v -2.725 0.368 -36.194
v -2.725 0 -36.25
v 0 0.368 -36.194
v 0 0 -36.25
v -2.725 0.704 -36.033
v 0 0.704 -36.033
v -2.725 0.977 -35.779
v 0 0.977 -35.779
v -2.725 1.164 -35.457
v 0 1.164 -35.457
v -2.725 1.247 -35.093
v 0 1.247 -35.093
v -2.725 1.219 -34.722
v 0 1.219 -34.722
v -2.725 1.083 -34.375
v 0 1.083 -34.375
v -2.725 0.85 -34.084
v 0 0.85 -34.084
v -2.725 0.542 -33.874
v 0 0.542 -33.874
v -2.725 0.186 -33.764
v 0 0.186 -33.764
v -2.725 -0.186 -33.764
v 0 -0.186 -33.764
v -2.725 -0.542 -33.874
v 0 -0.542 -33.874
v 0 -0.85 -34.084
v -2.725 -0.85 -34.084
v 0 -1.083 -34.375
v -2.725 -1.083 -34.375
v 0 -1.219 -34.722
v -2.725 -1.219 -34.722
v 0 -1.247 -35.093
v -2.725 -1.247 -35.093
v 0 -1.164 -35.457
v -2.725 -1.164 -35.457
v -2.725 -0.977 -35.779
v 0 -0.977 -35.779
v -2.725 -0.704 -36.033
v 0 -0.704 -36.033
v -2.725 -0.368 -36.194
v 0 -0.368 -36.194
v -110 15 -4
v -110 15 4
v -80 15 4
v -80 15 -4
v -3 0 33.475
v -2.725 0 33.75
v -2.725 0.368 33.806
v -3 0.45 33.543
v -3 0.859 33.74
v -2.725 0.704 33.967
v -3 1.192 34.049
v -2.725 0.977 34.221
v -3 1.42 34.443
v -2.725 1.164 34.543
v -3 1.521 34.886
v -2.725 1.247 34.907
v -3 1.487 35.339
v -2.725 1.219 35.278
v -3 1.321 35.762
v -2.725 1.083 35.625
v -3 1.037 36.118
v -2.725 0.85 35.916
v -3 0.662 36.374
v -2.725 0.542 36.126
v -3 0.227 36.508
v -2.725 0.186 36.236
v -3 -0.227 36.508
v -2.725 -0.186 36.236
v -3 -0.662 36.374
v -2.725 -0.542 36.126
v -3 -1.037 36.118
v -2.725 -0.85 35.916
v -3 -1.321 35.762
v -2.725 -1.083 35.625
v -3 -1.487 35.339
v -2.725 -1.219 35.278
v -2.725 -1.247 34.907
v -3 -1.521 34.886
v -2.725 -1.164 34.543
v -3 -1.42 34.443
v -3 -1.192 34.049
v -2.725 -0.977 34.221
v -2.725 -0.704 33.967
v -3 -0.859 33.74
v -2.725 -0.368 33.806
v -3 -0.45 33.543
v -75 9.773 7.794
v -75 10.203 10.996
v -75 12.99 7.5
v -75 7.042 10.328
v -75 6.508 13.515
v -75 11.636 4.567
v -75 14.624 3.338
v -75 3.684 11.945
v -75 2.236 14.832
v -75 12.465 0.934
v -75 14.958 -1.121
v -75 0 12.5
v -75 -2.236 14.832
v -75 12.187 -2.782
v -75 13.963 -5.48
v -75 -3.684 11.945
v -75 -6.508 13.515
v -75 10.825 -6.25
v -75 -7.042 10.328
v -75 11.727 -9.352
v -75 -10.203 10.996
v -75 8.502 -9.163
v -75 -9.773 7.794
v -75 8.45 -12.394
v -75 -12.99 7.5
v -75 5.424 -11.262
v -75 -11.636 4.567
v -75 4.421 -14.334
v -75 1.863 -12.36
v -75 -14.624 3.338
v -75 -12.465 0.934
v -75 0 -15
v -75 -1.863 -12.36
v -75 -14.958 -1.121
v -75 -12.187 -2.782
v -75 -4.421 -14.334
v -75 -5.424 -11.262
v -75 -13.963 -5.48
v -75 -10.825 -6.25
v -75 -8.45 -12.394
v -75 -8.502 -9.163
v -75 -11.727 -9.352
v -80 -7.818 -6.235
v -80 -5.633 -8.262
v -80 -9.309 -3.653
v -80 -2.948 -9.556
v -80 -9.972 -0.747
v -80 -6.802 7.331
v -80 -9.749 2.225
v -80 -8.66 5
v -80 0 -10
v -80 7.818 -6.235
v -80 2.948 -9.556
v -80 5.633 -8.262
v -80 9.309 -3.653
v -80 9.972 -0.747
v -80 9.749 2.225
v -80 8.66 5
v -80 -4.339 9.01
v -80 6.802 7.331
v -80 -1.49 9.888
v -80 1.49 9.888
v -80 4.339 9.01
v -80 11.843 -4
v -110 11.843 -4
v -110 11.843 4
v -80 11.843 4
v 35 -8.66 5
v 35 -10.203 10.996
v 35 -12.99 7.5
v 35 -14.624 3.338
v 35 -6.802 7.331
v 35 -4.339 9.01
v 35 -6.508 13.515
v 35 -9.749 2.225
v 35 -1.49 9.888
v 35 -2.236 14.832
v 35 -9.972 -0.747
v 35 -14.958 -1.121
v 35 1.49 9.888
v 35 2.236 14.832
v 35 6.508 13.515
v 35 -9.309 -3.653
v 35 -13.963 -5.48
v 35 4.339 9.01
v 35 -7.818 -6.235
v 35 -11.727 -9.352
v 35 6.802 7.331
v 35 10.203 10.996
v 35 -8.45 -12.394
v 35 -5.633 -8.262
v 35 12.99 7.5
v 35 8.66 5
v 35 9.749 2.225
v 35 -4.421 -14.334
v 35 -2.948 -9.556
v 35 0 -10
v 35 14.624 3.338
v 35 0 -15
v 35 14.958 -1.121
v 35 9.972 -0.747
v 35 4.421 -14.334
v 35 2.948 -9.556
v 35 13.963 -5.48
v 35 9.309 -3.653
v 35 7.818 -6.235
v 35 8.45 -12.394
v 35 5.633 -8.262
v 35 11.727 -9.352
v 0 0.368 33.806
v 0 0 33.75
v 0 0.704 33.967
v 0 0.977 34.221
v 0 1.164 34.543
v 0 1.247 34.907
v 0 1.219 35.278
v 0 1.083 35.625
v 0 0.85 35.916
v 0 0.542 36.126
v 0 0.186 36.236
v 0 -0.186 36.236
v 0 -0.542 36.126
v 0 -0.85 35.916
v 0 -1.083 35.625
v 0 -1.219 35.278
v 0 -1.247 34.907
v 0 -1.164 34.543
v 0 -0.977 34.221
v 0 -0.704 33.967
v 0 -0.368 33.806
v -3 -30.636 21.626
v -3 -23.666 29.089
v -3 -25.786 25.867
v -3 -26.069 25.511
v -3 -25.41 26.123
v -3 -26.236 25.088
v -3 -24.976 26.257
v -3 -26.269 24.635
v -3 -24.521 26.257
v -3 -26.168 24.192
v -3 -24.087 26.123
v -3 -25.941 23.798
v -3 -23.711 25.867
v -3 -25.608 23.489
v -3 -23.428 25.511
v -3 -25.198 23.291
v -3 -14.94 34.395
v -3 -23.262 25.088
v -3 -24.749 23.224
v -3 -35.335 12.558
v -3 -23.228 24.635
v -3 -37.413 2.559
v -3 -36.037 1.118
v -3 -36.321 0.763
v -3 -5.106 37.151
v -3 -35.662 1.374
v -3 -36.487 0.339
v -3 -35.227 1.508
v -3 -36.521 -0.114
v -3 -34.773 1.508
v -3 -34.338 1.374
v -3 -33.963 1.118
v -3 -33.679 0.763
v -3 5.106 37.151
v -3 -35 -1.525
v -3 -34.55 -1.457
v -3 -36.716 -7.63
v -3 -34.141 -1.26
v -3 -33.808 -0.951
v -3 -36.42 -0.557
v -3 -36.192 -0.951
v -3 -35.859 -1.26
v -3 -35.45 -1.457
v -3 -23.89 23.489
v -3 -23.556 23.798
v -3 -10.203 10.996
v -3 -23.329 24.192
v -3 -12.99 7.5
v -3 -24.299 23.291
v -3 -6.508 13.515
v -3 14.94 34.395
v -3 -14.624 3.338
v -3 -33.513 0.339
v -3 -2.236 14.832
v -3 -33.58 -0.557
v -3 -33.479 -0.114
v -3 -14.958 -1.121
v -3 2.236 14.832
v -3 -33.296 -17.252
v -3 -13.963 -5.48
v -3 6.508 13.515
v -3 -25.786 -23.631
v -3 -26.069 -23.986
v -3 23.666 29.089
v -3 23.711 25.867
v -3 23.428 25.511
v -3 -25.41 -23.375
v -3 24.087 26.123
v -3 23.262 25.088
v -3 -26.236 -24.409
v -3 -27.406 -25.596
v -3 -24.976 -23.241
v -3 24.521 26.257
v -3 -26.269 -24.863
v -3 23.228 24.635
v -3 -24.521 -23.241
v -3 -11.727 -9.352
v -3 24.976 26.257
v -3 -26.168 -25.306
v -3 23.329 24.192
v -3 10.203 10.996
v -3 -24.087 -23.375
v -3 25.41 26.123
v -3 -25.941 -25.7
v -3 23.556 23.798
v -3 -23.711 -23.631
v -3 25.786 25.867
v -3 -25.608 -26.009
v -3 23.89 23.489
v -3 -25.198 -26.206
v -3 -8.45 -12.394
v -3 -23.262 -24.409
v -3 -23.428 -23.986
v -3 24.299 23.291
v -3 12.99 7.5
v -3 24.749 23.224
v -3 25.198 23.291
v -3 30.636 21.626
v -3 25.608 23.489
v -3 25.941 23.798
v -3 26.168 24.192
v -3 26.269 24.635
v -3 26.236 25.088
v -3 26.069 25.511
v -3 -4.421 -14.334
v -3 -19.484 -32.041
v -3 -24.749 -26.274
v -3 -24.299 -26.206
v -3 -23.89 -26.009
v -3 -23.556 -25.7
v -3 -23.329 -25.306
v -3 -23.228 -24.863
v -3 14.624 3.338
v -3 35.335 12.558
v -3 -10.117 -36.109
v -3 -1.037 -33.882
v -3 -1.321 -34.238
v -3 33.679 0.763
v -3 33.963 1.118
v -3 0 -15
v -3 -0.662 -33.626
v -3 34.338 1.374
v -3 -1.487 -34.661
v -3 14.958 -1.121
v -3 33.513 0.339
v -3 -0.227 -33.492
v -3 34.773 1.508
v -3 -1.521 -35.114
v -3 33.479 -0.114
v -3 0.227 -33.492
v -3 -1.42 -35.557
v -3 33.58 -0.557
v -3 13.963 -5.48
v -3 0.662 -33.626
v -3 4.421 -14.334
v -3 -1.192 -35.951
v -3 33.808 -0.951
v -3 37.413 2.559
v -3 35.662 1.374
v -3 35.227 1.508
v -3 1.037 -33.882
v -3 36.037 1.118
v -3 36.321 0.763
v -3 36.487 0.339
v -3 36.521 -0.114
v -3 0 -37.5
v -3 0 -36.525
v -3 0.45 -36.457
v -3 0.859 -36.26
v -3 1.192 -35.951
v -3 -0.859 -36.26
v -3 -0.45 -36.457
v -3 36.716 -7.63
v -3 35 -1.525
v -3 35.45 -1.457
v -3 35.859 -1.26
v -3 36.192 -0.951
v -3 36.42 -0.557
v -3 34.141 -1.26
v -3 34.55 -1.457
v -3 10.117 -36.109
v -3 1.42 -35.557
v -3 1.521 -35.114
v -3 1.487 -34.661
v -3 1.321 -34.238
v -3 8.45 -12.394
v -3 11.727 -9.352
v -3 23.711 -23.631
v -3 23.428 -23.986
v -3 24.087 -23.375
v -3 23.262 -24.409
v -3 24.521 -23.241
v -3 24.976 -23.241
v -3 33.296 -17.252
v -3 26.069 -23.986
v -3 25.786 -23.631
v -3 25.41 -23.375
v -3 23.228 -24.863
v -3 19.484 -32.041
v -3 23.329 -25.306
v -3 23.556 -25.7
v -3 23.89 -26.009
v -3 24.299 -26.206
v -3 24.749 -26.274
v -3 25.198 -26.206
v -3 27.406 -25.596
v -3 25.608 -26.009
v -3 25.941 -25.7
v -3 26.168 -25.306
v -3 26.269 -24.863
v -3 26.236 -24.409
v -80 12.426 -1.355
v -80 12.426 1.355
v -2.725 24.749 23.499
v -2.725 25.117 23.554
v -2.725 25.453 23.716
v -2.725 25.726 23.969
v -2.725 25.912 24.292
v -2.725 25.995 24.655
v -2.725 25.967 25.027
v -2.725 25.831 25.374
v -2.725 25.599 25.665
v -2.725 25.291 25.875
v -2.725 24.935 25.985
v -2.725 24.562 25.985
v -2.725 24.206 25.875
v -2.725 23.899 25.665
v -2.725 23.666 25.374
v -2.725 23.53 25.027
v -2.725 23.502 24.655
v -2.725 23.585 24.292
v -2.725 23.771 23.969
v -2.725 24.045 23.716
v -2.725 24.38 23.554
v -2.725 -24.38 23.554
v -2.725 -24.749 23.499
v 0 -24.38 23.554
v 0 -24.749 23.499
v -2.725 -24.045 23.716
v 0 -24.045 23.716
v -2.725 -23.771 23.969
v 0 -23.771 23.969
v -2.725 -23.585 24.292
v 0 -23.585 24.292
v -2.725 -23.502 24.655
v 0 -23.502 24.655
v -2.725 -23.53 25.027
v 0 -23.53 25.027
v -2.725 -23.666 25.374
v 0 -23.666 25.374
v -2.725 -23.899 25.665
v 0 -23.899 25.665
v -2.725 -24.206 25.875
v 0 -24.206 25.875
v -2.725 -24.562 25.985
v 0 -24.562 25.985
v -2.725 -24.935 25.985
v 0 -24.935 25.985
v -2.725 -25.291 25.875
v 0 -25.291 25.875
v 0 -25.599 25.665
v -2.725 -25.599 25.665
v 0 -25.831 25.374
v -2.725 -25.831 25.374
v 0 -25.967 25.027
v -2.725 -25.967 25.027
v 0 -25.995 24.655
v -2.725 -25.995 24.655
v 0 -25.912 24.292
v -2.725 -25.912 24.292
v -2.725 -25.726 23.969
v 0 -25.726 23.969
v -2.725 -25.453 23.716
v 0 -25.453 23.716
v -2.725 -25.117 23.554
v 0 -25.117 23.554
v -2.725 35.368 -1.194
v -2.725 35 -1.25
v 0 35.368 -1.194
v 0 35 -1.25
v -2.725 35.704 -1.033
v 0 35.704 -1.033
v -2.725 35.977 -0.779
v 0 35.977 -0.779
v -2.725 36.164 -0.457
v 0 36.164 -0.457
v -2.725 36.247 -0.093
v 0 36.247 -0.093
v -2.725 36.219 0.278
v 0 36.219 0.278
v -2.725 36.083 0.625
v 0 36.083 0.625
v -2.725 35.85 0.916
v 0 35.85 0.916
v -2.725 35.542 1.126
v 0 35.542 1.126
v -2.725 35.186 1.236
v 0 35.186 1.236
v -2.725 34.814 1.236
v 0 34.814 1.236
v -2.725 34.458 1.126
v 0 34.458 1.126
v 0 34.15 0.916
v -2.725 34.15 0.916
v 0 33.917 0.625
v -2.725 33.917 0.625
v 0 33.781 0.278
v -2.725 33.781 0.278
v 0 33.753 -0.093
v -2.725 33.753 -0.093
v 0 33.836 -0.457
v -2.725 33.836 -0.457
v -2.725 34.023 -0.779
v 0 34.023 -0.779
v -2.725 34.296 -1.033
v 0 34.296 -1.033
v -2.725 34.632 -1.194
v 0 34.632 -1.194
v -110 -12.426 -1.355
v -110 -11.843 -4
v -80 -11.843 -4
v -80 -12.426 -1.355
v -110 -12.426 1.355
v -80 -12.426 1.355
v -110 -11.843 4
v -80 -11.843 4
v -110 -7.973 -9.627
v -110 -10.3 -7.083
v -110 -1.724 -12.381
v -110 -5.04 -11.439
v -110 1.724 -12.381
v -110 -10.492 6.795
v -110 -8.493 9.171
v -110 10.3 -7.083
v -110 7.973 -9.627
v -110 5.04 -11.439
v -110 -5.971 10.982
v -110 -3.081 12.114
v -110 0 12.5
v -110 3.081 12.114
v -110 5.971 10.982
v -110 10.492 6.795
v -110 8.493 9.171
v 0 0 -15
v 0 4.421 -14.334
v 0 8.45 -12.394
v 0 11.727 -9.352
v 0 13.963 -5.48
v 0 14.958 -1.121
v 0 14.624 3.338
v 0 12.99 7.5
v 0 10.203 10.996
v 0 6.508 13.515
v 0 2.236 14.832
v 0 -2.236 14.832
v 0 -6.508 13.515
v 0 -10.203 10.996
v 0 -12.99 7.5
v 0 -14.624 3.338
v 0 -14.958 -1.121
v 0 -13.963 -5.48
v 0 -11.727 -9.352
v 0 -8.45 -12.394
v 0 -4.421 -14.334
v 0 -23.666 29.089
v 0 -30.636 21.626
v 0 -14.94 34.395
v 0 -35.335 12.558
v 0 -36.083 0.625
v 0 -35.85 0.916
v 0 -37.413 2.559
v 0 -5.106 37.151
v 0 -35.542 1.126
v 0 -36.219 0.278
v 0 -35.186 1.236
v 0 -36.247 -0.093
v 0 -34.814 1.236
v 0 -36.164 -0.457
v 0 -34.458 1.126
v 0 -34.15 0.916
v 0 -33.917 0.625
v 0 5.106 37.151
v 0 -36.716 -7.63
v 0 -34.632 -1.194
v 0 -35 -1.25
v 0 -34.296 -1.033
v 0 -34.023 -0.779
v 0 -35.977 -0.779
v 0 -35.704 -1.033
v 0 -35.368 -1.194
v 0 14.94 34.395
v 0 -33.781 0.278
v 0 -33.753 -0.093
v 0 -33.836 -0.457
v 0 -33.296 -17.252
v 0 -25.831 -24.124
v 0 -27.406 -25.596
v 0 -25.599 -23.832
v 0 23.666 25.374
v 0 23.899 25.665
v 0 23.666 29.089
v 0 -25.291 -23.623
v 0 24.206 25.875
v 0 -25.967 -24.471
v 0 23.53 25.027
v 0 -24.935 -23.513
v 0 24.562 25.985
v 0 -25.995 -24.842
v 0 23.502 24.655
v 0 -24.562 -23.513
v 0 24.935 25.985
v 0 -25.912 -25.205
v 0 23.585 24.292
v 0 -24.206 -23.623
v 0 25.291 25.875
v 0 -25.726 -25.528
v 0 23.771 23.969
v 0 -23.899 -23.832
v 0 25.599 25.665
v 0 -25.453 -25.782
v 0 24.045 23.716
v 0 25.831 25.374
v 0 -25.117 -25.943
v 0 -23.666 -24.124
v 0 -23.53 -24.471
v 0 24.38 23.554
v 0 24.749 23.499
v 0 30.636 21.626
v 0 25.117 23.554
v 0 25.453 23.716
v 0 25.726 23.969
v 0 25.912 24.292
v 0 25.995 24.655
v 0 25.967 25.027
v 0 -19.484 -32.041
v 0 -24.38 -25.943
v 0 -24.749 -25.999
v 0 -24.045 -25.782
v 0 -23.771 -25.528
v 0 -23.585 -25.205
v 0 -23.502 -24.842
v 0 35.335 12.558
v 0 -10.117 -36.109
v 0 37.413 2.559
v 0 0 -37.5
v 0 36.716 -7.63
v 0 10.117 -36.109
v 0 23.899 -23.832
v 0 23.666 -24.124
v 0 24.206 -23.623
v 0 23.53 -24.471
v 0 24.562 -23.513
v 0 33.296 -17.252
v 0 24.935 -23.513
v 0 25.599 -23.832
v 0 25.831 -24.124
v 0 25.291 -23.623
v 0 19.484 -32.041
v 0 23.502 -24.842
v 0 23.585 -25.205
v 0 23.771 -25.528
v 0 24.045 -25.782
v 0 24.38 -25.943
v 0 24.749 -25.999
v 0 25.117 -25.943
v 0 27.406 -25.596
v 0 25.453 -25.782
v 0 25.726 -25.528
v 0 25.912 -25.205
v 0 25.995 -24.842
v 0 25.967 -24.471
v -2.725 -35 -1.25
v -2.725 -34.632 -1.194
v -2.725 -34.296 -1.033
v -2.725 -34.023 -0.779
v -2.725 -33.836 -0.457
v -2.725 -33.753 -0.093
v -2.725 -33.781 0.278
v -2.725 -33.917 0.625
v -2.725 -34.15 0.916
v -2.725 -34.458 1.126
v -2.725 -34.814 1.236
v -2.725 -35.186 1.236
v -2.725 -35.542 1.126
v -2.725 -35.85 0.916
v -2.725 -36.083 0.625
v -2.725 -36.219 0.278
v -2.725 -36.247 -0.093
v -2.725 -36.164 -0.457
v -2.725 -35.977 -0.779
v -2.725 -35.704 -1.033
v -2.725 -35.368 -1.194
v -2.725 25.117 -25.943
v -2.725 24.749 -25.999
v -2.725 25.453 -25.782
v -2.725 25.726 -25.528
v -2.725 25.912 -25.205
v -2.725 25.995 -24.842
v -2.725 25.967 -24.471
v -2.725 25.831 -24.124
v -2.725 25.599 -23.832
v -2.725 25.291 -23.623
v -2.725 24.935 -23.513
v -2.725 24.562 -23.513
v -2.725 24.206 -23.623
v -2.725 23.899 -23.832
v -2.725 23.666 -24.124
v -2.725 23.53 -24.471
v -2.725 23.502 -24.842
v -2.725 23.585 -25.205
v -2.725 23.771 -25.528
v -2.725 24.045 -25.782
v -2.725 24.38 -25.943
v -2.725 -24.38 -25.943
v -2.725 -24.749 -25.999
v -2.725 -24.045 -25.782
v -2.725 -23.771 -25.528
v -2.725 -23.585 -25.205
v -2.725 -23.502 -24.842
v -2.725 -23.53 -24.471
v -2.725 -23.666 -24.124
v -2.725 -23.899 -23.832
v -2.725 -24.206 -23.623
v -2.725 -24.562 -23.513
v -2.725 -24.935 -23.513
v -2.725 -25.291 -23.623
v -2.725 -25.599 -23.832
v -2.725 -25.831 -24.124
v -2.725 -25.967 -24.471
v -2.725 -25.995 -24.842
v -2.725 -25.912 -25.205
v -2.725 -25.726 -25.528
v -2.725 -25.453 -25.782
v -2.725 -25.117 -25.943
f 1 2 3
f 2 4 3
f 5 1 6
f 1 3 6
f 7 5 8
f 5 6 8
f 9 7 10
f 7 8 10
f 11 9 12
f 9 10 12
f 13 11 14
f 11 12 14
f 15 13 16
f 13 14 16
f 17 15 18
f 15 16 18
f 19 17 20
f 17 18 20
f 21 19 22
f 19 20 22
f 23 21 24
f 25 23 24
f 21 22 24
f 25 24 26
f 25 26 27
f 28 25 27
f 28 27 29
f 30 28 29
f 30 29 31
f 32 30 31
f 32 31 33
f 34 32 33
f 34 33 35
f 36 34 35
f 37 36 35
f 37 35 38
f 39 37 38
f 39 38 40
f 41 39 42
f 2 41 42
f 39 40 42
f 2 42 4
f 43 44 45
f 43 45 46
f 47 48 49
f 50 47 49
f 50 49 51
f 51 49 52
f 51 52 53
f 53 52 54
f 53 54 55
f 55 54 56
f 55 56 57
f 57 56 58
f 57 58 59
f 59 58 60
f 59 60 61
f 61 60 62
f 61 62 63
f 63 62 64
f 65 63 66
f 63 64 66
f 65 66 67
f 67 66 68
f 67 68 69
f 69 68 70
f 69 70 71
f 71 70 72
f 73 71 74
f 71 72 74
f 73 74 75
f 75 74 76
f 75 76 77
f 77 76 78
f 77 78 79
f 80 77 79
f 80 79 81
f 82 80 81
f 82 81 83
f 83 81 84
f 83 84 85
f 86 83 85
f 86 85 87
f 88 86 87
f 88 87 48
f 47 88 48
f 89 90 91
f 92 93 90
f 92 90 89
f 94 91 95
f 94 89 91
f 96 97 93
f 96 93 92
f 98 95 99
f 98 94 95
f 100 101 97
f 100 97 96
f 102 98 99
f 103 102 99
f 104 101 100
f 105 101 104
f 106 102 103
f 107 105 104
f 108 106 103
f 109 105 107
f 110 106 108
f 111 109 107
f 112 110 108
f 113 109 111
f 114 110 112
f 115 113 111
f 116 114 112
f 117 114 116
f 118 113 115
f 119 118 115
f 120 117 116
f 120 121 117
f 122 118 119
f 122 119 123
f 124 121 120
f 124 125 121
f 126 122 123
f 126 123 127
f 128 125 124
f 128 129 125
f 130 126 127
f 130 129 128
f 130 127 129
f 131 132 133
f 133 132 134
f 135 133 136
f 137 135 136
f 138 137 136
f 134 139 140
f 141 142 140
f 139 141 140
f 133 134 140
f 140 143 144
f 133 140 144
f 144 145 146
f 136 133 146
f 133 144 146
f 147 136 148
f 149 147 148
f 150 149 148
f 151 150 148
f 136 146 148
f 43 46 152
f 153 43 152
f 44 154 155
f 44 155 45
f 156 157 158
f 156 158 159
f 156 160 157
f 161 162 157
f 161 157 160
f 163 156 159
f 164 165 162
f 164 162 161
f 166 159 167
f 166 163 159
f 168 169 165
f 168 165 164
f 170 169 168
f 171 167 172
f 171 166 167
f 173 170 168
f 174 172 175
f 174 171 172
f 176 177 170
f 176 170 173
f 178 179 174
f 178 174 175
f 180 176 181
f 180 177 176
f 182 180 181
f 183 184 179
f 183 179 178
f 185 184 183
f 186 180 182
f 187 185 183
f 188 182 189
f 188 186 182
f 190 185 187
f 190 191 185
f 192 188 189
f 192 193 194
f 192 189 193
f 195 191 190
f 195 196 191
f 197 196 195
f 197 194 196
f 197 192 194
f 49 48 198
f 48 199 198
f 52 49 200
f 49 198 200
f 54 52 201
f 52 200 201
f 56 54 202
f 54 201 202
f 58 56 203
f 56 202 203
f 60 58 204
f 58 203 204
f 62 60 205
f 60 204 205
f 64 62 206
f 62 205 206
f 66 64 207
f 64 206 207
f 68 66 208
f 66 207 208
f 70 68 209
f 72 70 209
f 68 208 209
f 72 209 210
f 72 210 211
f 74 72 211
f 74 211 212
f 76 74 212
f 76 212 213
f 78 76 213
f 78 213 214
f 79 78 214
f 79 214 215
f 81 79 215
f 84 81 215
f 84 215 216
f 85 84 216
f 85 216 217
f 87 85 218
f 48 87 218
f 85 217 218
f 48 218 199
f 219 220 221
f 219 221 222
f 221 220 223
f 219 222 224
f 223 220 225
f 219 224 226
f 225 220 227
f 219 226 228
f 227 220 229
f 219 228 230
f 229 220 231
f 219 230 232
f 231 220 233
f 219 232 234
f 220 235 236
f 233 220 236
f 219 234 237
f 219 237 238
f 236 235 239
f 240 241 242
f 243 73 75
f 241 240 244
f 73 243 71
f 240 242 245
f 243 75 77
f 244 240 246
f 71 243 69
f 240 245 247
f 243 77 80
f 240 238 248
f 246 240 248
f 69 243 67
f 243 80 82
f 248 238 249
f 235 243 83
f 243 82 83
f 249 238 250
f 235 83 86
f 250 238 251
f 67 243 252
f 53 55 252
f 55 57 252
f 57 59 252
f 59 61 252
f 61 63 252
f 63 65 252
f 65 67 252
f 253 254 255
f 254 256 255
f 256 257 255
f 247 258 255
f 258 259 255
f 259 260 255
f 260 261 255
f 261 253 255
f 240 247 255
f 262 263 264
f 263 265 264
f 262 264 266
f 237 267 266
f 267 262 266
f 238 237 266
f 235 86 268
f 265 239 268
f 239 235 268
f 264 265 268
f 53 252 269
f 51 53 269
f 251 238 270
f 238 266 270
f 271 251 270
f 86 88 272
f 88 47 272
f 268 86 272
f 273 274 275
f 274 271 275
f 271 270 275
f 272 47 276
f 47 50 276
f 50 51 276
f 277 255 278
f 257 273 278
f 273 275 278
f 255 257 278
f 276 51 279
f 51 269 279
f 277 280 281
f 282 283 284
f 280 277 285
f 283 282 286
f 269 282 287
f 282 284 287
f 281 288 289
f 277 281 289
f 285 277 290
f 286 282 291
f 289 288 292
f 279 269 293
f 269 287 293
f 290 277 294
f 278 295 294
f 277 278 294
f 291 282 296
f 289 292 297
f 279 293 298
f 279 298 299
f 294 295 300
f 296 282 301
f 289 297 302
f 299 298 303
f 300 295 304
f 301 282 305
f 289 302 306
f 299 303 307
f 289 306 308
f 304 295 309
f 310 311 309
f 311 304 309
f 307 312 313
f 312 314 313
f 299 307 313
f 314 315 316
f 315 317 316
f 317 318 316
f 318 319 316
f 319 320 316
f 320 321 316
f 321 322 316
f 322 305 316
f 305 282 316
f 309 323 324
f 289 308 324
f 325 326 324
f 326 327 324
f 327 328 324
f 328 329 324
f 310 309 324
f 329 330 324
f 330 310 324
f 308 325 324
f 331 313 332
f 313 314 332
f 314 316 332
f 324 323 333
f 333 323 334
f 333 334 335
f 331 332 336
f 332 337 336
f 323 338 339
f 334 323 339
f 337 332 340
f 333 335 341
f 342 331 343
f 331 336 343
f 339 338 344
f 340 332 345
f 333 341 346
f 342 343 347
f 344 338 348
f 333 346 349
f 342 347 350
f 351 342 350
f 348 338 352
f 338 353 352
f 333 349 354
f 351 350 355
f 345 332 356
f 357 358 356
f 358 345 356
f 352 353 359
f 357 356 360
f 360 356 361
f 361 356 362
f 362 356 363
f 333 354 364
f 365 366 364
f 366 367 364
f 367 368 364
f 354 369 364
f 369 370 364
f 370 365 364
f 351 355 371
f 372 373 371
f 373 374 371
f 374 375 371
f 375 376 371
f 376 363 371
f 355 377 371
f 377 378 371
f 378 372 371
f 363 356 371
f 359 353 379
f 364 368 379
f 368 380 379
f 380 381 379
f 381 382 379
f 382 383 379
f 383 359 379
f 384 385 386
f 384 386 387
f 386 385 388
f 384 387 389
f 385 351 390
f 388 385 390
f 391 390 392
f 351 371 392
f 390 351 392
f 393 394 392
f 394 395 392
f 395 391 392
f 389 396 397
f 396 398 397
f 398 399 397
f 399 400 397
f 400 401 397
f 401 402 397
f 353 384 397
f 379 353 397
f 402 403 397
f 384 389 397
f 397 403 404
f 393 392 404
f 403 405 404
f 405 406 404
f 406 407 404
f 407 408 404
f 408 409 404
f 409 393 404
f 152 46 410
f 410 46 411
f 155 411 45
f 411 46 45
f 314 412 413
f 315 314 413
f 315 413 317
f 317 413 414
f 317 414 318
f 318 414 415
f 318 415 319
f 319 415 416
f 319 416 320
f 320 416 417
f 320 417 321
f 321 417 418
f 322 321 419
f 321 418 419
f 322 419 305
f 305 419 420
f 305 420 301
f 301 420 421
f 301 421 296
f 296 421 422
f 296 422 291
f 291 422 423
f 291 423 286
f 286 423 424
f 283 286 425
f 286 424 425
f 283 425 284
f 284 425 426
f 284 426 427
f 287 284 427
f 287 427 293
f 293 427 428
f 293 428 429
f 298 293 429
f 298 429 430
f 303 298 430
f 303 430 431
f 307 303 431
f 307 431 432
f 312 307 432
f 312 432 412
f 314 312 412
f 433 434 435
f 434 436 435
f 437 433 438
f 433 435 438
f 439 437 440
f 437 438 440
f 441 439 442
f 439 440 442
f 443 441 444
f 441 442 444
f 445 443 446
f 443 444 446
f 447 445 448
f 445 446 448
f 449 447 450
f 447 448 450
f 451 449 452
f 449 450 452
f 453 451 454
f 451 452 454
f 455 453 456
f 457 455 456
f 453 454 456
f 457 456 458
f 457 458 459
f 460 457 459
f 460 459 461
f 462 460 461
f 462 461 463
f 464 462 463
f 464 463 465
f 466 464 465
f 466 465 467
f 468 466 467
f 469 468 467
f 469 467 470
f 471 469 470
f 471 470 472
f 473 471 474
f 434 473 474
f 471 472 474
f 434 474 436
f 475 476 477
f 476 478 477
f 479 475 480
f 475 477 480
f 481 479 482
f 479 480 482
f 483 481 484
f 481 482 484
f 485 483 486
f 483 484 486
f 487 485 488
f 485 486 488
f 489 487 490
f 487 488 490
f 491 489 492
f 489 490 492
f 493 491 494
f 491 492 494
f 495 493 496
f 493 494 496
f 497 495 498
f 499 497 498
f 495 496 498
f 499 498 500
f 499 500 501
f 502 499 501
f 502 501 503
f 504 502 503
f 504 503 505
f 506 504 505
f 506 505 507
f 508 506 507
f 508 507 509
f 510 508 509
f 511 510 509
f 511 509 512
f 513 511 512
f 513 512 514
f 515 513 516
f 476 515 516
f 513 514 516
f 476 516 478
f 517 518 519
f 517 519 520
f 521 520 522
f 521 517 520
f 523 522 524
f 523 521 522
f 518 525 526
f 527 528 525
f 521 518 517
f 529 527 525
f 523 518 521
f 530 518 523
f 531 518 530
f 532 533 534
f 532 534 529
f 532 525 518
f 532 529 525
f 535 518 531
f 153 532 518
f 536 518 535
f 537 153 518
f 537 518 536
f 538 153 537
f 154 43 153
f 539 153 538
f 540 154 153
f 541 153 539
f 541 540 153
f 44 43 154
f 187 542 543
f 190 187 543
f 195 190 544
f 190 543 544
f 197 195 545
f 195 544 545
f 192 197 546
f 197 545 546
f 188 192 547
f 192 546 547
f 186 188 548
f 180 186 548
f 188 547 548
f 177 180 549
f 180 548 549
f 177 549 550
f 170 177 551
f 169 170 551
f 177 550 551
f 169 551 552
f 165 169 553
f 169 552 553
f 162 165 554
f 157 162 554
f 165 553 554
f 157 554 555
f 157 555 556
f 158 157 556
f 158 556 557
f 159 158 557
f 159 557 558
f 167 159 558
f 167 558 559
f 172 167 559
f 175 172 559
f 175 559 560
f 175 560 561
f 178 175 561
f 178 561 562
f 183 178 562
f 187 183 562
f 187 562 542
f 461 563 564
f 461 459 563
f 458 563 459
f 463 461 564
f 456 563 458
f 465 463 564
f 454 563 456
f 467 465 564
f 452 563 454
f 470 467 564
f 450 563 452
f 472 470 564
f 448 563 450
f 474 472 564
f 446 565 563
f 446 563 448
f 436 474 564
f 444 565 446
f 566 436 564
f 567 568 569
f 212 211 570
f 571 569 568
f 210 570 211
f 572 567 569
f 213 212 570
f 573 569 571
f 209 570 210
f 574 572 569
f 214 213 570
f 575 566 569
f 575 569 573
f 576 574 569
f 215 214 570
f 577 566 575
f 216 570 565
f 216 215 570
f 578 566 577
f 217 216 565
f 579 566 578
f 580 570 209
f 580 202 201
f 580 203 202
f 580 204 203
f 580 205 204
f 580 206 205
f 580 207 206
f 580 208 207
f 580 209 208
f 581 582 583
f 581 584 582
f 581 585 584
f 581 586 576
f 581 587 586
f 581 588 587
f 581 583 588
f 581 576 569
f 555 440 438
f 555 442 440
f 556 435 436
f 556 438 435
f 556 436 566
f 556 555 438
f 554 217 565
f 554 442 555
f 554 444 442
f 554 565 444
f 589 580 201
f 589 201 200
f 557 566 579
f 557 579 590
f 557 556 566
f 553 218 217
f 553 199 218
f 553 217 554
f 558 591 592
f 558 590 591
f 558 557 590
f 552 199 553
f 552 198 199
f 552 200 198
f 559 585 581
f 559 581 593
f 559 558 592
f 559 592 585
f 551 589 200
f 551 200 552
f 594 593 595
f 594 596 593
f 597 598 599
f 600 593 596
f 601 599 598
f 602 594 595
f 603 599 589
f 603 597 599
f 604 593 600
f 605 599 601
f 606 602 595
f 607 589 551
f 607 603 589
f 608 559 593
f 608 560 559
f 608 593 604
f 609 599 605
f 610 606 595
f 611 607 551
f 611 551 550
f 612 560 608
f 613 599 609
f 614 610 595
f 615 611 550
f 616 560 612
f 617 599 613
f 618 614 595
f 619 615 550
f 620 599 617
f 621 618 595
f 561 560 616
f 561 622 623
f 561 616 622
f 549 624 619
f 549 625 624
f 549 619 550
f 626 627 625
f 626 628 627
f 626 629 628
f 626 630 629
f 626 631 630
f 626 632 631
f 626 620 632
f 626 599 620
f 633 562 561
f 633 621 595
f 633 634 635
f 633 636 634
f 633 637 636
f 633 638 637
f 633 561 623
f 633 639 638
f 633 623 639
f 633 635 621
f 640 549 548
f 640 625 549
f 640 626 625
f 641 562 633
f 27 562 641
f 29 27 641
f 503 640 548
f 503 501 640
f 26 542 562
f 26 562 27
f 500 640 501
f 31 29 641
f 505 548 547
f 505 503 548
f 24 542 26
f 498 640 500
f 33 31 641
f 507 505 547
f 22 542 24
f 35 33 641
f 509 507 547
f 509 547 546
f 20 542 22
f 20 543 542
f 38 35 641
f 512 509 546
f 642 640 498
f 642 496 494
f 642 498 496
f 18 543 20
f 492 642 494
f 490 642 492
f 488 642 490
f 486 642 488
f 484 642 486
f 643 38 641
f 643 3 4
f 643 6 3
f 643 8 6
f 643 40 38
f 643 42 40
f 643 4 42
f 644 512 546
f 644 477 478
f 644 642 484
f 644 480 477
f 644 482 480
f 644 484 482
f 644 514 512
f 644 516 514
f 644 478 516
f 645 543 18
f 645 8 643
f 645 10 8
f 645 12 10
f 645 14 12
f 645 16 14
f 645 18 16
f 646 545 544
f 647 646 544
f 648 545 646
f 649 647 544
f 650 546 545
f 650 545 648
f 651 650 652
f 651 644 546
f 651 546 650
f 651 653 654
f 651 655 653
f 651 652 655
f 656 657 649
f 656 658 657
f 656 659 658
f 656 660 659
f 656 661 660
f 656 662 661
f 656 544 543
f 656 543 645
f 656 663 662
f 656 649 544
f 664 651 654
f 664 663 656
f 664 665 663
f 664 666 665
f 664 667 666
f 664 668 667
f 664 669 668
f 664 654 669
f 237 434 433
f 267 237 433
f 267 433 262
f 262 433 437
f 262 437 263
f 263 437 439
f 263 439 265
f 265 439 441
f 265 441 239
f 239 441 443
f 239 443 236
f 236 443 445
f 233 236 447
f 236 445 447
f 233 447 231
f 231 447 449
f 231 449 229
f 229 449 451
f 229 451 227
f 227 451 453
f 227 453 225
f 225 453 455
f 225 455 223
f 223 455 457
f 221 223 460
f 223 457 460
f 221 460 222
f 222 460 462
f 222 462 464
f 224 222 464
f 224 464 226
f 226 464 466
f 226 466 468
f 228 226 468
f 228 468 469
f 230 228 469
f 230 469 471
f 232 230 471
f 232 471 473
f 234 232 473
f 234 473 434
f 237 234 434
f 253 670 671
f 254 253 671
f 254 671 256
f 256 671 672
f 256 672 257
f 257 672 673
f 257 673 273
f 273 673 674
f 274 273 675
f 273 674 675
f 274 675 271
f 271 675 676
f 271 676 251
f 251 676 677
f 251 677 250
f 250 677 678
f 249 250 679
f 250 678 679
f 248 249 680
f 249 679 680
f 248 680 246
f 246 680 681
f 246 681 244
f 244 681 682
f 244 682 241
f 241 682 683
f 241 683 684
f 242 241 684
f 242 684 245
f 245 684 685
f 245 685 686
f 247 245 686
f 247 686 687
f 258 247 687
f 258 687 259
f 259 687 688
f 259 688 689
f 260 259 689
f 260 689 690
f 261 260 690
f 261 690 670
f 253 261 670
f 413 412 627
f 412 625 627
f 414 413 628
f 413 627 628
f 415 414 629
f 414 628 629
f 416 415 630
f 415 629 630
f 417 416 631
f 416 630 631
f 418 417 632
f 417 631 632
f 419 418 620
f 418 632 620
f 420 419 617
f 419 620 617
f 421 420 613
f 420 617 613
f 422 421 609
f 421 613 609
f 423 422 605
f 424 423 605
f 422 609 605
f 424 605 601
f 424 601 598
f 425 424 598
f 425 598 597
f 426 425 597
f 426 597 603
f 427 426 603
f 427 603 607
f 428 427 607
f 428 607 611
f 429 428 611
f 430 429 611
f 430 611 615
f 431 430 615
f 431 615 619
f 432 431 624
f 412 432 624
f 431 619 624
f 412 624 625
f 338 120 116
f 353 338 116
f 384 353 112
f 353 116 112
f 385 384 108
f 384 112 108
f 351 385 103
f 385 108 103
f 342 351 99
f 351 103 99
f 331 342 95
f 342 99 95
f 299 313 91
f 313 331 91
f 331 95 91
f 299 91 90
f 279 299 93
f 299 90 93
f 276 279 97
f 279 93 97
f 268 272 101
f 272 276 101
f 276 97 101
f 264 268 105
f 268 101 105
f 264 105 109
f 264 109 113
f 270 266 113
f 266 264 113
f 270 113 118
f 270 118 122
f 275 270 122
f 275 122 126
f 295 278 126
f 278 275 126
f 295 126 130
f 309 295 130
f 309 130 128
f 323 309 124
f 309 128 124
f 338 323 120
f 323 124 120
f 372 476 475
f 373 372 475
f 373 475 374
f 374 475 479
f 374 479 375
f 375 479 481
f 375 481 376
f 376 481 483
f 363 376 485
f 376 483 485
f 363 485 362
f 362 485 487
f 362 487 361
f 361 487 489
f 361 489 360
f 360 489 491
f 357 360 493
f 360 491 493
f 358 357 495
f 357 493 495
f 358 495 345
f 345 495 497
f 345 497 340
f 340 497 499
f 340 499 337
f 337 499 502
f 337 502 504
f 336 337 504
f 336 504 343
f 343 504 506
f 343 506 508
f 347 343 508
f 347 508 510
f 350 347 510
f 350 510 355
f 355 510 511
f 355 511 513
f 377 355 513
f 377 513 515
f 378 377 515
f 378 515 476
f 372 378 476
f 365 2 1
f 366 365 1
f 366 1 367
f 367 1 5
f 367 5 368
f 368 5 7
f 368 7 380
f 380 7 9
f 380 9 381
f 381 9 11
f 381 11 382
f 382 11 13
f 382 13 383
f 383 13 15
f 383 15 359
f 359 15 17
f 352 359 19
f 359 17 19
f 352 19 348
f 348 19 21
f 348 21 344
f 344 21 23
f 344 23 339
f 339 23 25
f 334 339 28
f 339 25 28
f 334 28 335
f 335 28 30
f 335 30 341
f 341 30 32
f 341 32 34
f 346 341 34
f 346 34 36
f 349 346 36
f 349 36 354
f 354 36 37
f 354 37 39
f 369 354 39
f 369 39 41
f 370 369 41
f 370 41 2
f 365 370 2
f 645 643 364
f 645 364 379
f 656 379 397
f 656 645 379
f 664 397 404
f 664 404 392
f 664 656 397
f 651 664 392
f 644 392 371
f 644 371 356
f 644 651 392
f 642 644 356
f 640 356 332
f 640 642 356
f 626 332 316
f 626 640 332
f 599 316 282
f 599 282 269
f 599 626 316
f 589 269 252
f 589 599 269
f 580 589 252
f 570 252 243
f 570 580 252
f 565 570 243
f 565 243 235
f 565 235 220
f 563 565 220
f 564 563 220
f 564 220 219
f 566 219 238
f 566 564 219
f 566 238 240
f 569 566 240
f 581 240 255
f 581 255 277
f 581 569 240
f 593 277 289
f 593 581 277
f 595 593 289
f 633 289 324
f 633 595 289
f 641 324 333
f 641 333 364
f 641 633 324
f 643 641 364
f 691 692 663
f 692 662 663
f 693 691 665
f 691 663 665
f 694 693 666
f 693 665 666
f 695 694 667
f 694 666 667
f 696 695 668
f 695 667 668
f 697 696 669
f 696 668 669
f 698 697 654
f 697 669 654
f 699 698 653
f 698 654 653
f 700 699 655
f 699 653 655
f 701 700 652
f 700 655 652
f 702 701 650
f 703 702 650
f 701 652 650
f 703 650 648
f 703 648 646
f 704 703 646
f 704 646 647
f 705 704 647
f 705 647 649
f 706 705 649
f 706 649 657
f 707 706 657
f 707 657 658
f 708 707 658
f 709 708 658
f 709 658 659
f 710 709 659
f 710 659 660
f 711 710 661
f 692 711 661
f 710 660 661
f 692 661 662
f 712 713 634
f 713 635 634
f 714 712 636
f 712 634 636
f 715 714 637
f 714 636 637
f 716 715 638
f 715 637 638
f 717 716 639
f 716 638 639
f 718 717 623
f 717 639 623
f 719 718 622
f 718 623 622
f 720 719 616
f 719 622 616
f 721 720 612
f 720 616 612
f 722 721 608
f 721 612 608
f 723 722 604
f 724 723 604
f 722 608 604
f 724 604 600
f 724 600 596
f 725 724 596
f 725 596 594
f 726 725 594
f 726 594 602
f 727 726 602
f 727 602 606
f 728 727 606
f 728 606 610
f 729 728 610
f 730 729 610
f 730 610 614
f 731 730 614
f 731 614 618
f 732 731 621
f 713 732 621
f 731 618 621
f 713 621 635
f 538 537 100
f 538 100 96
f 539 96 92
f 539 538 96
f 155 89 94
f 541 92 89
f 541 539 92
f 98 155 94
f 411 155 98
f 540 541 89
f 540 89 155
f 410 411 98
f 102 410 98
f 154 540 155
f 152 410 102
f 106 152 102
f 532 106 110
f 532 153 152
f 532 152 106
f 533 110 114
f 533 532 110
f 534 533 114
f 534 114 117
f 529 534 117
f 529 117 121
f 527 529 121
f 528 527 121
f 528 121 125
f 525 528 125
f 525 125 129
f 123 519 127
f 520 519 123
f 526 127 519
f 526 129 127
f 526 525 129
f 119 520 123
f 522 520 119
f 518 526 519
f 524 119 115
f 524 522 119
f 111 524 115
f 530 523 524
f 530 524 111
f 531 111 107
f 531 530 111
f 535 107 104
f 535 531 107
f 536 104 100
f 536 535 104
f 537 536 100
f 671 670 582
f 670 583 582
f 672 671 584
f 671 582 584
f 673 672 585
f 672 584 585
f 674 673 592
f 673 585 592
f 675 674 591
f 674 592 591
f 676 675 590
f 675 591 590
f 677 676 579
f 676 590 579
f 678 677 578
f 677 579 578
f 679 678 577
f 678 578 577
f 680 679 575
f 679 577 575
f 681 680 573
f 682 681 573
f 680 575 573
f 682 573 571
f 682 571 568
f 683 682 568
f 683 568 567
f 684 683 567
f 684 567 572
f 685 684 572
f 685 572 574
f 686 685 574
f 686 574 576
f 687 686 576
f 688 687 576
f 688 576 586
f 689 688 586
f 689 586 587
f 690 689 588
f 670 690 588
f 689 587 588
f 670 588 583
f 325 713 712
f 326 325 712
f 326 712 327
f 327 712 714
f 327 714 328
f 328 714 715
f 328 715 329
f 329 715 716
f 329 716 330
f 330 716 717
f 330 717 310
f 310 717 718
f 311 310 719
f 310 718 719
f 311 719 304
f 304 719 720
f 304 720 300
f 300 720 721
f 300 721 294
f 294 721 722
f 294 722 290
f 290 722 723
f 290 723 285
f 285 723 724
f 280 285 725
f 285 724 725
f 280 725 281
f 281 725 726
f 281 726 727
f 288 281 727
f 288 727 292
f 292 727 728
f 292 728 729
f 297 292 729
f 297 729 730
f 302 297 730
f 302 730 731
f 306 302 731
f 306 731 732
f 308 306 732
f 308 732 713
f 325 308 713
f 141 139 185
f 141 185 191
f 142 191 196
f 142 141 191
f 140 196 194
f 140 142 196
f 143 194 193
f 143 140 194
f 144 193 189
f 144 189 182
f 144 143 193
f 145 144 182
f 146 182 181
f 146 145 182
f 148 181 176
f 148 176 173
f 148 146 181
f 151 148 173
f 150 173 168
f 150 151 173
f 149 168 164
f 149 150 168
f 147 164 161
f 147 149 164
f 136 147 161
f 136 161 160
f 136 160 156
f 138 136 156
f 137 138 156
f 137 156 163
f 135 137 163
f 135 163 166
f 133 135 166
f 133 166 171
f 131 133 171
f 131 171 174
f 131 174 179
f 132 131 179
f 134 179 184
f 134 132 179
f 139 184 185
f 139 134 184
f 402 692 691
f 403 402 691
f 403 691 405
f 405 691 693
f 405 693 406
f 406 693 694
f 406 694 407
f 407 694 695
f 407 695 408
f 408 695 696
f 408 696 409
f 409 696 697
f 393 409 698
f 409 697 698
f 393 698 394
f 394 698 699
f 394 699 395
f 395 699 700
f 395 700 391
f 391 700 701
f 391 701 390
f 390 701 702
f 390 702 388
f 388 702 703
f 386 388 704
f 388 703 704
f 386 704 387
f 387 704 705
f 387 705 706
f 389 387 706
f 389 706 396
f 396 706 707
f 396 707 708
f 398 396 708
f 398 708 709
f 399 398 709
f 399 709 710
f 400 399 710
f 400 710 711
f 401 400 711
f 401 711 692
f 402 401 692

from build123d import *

# Parameters (mm, degrees)
SKETCH1_R                   = 25
SKETCH1_R_2                 = 10
BOSS_EXTRUDE1_DEPTH         = 3
BOSS_EXTRUDE2_DEPTH         = 35
BOSS_EXTRUDE2_DEPTH_BACK    = 110
SKETCH1_3_R                 = 15
SKETCH1_3_R_2               = 10
SKETCH1_4_R                 = 37.5
SKETCH1_4_R_2               = 25
BOSS_EXTRUDE3_DEPTH         = 3
M3_TAPPED_HOLE1_D           = 2.5
M3_TAPPED_HOLE1_CSINK_D     = 3.05
M3_TAPPED_HOLE1_CSINK_ANGLE = 90
SKETCH4_R                   = 20
SKETCH4_R_2                 = 12.5
CUT_EXTRUDE1_DEPTH          = 35
BOSS_EXTRUDE4_DEPTH         = 30


with BuildPart() as part:
    # Sketch1 → Boss-Extrude1 (new body)
    with BuildSketch(Plane(origin=(0, 0, 0), x_dir=(0, 0, -1), z_dir=(1, 0, 0))):
        Circle(SKETCH1_R)
        Circle(SKETCH1_R_2, mode=Mode.SUBTRACT)
    extrude(amount=-BOSS_EXTRUDE1_DEPTH)



with BuildPart() as body_2:
    # Sketch1<3> → Boss-Extrude2 (new, two sides: drawn at the far end of the back side and taken through both)
    with BuildSketch(Plane(origin=(0, 0, 0), x_dir=(0, 0, -1), z_dir=(1, 0, 0)).offset(-BOSS_EXTRUDE2_DEPTH_BACK)):
        Circle(SKETCH1_3_R)
        Circle(SKETCH1_3_R_2, mode=Mode.SUBTRACT)
    extrude(amount=BOSS_EXTRUDE2_DEPTH + BOSS_EXTRUDE2_DEPTH_BACK)


with BuildPart() as part_1:
    add(part.part)

    add(body_2.part)  # Boss-Extrude3 merges body 2
    # Sketch1<4> → Boss-Extrude3 (add)
    with BuildSketch(Plane(origin=(0, 0, 0), x_dir=(0, 0, -1), z_dir=(1, 0, 0))):
        Circle(SKETCH1_4_R)
        Circle(SKETCH1_4_R_2, mode=Mode.SUBTRACT)
    extrude(amount=-BOSS_EXTRUDE3_DEPTH)

    # M3 Tapped Hole1 (through all)
    with Locations(Plane.ZY.offset(3)):
        with Locations((35, 0), (0, 35), (-35, 0), (0, -35), (24.748737342, 24.748737342), (-24.748737342, 24.748737342), (-24.748737342, -24.748737342), (24.748737342, -24.748737342)):
            CounterSinkHole(M3_TAPPED_HOLE1_D / 2, M3_TAPPED_HOLE1_CSINK_D / 2, counter_sink_angle=M3_TAPPED_HOLE1_CSINK_ANGLE)

    # Sketch4 → Cut-Extrude1 (cut)
    with BuildSketch(Plane.ZY.offset(110)):
        Circle(SKETCH4_R)
        Circle(SKETCH4_R_2, mode=Mode.SUBTRACT)
    extrude(amount=-CUT_EXTRUDE1_DEPTH, mode=Mode.SUBTRACT)

    # Sketch4<3> → Boss-Extrude4 (add)
    with BuildSketch(Plane.ZY.offset(110)):
        with BuildLine():
            Line((4, 15), (-4, 15))
            Line((-4, 15), (-4, 11.842719282))
            ThreePointArc((-4, 11.842719282), (0, -12.5), (4, 11.842719282))
            Line((4, 11.842719282), (4, 15))
        make_face()
    extrude(amount=-BOSS_EXTRUDE4_DEPTH)


solid = part_1.part
